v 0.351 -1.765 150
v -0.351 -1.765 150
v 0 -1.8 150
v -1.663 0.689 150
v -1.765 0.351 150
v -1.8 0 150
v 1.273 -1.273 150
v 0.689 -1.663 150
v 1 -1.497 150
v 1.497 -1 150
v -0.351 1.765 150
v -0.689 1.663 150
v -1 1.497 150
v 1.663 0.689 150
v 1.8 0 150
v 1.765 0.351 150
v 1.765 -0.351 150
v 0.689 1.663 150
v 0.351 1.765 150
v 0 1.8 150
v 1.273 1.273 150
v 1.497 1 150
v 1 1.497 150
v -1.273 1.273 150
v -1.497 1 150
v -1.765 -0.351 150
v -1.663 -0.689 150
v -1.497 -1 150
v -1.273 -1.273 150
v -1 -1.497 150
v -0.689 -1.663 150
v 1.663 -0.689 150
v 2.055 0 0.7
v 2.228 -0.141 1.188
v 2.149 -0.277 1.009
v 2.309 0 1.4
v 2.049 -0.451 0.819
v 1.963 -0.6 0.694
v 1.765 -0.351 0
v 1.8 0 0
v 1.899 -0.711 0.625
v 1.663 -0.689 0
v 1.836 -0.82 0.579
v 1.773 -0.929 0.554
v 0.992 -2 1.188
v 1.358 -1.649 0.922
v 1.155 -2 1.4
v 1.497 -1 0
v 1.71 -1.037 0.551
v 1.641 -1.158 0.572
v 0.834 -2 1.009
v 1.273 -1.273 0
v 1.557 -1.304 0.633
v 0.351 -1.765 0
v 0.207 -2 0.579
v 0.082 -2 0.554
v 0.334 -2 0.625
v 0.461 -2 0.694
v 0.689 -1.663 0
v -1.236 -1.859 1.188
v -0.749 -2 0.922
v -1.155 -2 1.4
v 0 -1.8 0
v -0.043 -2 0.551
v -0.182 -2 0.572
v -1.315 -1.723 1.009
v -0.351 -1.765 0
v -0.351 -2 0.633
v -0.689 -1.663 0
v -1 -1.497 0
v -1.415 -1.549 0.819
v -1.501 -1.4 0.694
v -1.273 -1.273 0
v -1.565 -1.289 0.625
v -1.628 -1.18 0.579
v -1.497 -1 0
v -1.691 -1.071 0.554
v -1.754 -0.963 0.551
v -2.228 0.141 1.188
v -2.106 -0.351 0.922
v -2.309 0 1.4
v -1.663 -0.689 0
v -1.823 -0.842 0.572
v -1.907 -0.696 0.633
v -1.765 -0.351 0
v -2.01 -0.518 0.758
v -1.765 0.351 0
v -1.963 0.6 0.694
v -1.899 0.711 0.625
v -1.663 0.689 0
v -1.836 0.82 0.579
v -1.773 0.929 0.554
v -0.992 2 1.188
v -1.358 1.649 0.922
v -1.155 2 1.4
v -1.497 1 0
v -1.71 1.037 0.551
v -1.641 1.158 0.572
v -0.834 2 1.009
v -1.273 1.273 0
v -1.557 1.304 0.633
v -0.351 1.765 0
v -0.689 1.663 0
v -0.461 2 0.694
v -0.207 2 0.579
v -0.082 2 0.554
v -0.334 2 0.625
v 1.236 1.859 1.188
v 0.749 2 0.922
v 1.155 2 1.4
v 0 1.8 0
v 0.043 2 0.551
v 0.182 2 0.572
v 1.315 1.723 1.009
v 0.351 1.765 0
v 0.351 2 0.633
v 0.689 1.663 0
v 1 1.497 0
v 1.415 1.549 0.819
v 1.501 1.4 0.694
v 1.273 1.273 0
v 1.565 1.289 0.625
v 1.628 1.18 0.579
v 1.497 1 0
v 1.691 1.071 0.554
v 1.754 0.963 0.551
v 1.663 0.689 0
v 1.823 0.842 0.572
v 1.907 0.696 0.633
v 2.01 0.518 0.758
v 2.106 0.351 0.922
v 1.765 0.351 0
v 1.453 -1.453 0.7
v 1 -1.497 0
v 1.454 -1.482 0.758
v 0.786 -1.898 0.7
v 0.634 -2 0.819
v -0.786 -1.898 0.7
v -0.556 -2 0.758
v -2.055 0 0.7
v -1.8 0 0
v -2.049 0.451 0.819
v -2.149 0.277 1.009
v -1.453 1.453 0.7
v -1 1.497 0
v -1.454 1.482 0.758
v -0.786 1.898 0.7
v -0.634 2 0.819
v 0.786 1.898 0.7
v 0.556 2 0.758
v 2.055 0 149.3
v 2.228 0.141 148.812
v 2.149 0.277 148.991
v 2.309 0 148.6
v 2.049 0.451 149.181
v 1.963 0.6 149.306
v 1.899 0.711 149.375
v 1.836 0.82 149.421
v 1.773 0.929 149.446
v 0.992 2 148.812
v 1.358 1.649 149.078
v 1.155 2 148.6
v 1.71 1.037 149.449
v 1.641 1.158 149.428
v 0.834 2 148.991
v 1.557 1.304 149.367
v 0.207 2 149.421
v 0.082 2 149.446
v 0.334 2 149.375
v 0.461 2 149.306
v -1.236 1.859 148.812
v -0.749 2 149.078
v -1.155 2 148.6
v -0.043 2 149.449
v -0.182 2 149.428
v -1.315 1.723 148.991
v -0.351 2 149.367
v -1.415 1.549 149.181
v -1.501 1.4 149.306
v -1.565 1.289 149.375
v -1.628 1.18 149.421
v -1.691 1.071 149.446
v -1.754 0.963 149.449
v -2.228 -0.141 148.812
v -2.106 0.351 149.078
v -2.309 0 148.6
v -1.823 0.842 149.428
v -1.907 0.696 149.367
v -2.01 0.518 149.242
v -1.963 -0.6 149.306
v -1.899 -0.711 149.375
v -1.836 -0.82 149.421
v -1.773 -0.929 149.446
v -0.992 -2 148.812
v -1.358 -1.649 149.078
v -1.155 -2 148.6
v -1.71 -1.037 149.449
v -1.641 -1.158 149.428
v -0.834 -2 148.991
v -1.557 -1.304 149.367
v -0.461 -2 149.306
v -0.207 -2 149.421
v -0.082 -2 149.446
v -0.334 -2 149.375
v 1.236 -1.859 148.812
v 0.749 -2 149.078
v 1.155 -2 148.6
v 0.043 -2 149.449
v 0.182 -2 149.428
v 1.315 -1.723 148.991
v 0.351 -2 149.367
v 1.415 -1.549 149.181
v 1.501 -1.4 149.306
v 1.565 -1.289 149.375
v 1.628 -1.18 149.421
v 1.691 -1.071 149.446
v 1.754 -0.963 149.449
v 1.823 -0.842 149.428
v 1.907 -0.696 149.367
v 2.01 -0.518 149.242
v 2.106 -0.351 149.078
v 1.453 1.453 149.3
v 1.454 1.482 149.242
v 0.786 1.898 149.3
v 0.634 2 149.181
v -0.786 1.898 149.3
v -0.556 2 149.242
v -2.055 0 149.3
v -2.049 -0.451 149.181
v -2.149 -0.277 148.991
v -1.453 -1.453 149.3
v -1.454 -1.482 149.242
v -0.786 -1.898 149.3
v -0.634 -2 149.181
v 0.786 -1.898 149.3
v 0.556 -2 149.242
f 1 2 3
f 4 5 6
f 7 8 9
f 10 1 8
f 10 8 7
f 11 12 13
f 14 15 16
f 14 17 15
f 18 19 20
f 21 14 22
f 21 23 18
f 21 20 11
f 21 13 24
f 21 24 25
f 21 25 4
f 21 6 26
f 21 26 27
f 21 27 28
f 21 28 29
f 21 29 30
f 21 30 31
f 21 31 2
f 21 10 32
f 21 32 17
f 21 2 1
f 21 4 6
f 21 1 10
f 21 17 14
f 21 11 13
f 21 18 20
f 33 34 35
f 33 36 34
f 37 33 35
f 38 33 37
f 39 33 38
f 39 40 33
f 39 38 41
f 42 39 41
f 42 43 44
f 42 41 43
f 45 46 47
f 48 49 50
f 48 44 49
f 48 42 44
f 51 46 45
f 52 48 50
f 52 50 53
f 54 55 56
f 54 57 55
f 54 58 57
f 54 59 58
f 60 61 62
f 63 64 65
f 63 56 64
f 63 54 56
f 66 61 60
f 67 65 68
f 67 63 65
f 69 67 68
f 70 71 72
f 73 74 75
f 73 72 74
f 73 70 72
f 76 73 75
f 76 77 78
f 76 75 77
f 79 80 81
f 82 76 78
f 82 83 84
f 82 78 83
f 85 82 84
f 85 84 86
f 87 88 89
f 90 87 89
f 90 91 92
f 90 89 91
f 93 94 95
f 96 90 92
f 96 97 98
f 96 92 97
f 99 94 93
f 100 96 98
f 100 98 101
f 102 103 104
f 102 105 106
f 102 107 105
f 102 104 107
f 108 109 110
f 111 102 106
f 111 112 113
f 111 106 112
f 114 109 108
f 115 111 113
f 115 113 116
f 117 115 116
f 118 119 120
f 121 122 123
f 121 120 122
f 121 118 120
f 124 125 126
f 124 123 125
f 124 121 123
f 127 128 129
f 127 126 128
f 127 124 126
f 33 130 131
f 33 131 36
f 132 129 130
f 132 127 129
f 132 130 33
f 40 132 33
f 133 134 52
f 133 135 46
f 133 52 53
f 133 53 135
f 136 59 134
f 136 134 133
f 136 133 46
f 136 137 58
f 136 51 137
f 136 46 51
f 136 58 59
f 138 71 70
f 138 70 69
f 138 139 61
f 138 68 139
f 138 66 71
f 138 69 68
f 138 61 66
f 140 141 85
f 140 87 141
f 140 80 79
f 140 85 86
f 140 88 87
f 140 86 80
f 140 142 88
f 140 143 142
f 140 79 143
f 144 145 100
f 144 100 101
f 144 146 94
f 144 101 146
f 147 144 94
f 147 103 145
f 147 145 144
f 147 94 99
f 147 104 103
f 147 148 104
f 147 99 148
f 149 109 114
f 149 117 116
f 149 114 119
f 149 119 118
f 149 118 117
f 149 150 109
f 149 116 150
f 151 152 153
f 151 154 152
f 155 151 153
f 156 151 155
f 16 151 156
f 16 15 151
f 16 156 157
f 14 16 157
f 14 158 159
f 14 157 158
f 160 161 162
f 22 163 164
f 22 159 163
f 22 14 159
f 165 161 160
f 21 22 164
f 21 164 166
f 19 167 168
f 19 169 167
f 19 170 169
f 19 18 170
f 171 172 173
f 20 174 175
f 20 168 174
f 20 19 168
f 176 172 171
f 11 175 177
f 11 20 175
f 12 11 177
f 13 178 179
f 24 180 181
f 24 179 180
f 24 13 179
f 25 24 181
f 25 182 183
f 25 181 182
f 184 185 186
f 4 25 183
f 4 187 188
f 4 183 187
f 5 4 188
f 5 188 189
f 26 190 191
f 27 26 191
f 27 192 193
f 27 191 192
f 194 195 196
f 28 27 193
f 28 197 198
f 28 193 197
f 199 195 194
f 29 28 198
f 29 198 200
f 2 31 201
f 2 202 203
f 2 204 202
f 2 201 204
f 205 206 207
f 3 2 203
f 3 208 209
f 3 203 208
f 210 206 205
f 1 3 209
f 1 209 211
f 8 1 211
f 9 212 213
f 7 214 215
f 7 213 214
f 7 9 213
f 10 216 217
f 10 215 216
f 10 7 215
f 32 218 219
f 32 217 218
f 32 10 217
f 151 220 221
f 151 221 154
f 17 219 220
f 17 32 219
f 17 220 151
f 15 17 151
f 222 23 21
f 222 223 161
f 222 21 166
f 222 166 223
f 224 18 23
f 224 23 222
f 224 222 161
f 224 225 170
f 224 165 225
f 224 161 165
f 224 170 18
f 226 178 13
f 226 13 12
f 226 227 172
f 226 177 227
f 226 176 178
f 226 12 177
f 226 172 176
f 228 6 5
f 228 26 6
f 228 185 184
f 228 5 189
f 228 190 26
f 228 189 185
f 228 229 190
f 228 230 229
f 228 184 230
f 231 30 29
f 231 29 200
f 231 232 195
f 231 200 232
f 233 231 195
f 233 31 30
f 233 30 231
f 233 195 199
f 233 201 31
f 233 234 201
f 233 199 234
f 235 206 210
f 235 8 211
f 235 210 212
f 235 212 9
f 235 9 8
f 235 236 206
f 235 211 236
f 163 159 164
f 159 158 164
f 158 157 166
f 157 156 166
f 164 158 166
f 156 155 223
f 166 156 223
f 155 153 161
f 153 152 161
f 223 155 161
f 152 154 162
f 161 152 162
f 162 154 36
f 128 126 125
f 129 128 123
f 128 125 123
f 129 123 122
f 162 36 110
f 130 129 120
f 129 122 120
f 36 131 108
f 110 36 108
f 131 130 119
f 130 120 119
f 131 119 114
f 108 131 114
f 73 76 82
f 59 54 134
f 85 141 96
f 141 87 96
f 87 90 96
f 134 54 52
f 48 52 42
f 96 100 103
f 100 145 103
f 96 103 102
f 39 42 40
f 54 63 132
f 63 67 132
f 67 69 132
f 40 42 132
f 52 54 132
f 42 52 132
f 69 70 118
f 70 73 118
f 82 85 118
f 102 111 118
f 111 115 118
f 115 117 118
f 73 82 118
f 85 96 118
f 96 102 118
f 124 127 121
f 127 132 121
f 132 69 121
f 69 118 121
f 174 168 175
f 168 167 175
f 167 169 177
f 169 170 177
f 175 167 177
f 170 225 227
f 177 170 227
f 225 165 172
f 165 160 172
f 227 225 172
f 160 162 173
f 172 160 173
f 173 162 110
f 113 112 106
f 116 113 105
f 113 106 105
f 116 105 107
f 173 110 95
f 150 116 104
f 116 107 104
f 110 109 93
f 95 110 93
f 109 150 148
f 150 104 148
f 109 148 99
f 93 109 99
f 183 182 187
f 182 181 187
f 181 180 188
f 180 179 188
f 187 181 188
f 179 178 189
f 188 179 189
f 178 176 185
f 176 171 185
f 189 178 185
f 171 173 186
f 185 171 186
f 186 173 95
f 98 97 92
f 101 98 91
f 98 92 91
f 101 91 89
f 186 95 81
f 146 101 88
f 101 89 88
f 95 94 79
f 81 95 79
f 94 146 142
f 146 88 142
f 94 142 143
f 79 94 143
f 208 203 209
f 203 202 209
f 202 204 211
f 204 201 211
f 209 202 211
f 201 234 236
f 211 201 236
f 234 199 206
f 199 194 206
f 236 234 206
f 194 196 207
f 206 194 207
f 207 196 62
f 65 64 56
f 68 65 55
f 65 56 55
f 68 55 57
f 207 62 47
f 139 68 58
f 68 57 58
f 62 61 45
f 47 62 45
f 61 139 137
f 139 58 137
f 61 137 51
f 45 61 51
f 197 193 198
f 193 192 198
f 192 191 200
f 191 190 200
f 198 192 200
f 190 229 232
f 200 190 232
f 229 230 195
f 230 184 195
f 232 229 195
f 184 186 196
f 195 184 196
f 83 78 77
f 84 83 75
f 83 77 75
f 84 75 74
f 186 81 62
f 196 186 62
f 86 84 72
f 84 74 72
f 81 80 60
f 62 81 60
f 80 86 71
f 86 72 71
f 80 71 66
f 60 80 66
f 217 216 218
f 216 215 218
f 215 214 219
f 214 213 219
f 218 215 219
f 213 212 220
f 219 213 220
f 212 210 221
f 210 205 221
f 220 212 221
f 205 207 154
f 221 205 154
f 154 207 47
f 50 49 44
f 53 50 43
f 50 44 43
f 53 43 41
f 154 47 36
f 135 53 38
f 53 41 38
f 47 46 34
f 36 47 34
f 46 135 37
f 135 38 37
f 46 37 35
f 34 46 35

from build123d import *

# Parameters (mm, degrees)
SALIENTE_EXTRUIR1_DEPTH   = 150
CROQUIS2_OUTSIDE_W        = 38.098
CROQUIS2_OUTSIDE_H        = 37.48
CROQUIS2_OUTSIDE_R        = 1.8
CORTAR_EXTRUIR2_DEPTH     = 2
CORTAR_EXTRUIR2_DRAFT     = -20
SIMETR_A1_COPY_1_SKETCH_W = 38.098
SIMETR_A1_COPY_1_SKETCH_H = 37.48
SIMETR_A1_COPY_1_SKETCH_R = 1.8
SIMETR_A1_COPY_1_DEPTH    = 2
SIMETR_A1_COPY_1_DRAFT    = -20


with BuildPart() as part:
    # Croquis1 → Saliente-Extruir1 (new body)
    with BuildSketch(Plane.XY):
        Polygon((2.309401077, 0), (1.154700538, 2), (-1.154700538, 2), (-2.309401077, 0), (-1.154700538, -2), (1.154700538, -2), align=None)
    extrude(amount=SALIENTE_EXTRUIR1_DEPTH)


with BuildPart() as cortar_extruir2_tool:
    # Croquis2 outside → Cortar-Extruir2 (with draft: the straight prism first)
    with BuildSketch(Plane.XY.offset(150)):
        Rectangle(CROQUIS2_OUTSIDE_W, CROQUIS2_OUTSIDE_H)
        Circle(CROQUIS2_OUTSIDE_R, mode=Mode.SUBTRACT)
    extrude(amount=-CORTAR_EXTRUIR2_DEPTH)
    # Cortar-Extruir2: the draft: its side faces are tilted about the plane it starts from
    cortar_extruir2_sides = [cortar_extruir2_tool.faces().sort_by_distance(p)[0] for p in [
        (0, -18.74, 149),
        (19.049, 0, 149),
        (0, 18.74, 149),
        (-19.049, 0, 149),
        (-1.8, 0, 149),
    ]]
    draft(cortar_extruir2_sides, Plane.XY.offset(150), CORTAR_EXTRUIR2_DRAFT)


with BuildPart() as part_1:
    add(part.part)

    # Cortar-Extruir2: cut by cortar_extruir2_tool
    add(cortar_extruir2_tool.part, mode=Mode.SUBTRACT)


with BuildPart() as simetr_a1_copy_1_tool:
    # Simetría1 copy 1 sketch → Simetría1 copy 1 (with draft: the straight prism first)
    with BuildSketch(Plane(origin=(0, 0, 0), x_dir=(1, 0, 0), z_dir=(0, 0, -1))):
        Rectangle(SIMETR_A1_COPY_1_SKETCH_W, SIMETR_A1_COPY_1_SKETCH_H)
        Circle(SIMETR_A1_COPY_1_SKETCH_R, mode=Mode.SUBTRACT)
    extrude(amount=-SIMETR_A1_COPY_1_DEPTH)
    # Simetría1 copy 1: the draft: its side faces are tilted about the plane it starts from
    simetr_a1_copy_1_sides = [simetr_a1_copy_1_tool.faces().sort_by_distance(p)[0] for p in [
        (0, -18.74, 1),
        (19.049, 0, 1),
        (0, 18.74, 1),
        (-19.049, 0, 1),
        (-1.8, 0, 1),
    ]]
    draft(simetr_a1_copy_1_sides, Plane(origin=(0, 0, 0), x_dir=(1, 0, 0), z_dir=(0, 0, -1)), SIMETR_A1_COPY_1_DRAFT)


with BuildPart() as part_2:
    add(part_1.part)

    # Simetría1 copy 1: cut by simetr_a1_copy_1_tool
    add(simetr_a1_copy_1_tool.part, mode=Mode.SUBTRACT)


solid = part_2.part
